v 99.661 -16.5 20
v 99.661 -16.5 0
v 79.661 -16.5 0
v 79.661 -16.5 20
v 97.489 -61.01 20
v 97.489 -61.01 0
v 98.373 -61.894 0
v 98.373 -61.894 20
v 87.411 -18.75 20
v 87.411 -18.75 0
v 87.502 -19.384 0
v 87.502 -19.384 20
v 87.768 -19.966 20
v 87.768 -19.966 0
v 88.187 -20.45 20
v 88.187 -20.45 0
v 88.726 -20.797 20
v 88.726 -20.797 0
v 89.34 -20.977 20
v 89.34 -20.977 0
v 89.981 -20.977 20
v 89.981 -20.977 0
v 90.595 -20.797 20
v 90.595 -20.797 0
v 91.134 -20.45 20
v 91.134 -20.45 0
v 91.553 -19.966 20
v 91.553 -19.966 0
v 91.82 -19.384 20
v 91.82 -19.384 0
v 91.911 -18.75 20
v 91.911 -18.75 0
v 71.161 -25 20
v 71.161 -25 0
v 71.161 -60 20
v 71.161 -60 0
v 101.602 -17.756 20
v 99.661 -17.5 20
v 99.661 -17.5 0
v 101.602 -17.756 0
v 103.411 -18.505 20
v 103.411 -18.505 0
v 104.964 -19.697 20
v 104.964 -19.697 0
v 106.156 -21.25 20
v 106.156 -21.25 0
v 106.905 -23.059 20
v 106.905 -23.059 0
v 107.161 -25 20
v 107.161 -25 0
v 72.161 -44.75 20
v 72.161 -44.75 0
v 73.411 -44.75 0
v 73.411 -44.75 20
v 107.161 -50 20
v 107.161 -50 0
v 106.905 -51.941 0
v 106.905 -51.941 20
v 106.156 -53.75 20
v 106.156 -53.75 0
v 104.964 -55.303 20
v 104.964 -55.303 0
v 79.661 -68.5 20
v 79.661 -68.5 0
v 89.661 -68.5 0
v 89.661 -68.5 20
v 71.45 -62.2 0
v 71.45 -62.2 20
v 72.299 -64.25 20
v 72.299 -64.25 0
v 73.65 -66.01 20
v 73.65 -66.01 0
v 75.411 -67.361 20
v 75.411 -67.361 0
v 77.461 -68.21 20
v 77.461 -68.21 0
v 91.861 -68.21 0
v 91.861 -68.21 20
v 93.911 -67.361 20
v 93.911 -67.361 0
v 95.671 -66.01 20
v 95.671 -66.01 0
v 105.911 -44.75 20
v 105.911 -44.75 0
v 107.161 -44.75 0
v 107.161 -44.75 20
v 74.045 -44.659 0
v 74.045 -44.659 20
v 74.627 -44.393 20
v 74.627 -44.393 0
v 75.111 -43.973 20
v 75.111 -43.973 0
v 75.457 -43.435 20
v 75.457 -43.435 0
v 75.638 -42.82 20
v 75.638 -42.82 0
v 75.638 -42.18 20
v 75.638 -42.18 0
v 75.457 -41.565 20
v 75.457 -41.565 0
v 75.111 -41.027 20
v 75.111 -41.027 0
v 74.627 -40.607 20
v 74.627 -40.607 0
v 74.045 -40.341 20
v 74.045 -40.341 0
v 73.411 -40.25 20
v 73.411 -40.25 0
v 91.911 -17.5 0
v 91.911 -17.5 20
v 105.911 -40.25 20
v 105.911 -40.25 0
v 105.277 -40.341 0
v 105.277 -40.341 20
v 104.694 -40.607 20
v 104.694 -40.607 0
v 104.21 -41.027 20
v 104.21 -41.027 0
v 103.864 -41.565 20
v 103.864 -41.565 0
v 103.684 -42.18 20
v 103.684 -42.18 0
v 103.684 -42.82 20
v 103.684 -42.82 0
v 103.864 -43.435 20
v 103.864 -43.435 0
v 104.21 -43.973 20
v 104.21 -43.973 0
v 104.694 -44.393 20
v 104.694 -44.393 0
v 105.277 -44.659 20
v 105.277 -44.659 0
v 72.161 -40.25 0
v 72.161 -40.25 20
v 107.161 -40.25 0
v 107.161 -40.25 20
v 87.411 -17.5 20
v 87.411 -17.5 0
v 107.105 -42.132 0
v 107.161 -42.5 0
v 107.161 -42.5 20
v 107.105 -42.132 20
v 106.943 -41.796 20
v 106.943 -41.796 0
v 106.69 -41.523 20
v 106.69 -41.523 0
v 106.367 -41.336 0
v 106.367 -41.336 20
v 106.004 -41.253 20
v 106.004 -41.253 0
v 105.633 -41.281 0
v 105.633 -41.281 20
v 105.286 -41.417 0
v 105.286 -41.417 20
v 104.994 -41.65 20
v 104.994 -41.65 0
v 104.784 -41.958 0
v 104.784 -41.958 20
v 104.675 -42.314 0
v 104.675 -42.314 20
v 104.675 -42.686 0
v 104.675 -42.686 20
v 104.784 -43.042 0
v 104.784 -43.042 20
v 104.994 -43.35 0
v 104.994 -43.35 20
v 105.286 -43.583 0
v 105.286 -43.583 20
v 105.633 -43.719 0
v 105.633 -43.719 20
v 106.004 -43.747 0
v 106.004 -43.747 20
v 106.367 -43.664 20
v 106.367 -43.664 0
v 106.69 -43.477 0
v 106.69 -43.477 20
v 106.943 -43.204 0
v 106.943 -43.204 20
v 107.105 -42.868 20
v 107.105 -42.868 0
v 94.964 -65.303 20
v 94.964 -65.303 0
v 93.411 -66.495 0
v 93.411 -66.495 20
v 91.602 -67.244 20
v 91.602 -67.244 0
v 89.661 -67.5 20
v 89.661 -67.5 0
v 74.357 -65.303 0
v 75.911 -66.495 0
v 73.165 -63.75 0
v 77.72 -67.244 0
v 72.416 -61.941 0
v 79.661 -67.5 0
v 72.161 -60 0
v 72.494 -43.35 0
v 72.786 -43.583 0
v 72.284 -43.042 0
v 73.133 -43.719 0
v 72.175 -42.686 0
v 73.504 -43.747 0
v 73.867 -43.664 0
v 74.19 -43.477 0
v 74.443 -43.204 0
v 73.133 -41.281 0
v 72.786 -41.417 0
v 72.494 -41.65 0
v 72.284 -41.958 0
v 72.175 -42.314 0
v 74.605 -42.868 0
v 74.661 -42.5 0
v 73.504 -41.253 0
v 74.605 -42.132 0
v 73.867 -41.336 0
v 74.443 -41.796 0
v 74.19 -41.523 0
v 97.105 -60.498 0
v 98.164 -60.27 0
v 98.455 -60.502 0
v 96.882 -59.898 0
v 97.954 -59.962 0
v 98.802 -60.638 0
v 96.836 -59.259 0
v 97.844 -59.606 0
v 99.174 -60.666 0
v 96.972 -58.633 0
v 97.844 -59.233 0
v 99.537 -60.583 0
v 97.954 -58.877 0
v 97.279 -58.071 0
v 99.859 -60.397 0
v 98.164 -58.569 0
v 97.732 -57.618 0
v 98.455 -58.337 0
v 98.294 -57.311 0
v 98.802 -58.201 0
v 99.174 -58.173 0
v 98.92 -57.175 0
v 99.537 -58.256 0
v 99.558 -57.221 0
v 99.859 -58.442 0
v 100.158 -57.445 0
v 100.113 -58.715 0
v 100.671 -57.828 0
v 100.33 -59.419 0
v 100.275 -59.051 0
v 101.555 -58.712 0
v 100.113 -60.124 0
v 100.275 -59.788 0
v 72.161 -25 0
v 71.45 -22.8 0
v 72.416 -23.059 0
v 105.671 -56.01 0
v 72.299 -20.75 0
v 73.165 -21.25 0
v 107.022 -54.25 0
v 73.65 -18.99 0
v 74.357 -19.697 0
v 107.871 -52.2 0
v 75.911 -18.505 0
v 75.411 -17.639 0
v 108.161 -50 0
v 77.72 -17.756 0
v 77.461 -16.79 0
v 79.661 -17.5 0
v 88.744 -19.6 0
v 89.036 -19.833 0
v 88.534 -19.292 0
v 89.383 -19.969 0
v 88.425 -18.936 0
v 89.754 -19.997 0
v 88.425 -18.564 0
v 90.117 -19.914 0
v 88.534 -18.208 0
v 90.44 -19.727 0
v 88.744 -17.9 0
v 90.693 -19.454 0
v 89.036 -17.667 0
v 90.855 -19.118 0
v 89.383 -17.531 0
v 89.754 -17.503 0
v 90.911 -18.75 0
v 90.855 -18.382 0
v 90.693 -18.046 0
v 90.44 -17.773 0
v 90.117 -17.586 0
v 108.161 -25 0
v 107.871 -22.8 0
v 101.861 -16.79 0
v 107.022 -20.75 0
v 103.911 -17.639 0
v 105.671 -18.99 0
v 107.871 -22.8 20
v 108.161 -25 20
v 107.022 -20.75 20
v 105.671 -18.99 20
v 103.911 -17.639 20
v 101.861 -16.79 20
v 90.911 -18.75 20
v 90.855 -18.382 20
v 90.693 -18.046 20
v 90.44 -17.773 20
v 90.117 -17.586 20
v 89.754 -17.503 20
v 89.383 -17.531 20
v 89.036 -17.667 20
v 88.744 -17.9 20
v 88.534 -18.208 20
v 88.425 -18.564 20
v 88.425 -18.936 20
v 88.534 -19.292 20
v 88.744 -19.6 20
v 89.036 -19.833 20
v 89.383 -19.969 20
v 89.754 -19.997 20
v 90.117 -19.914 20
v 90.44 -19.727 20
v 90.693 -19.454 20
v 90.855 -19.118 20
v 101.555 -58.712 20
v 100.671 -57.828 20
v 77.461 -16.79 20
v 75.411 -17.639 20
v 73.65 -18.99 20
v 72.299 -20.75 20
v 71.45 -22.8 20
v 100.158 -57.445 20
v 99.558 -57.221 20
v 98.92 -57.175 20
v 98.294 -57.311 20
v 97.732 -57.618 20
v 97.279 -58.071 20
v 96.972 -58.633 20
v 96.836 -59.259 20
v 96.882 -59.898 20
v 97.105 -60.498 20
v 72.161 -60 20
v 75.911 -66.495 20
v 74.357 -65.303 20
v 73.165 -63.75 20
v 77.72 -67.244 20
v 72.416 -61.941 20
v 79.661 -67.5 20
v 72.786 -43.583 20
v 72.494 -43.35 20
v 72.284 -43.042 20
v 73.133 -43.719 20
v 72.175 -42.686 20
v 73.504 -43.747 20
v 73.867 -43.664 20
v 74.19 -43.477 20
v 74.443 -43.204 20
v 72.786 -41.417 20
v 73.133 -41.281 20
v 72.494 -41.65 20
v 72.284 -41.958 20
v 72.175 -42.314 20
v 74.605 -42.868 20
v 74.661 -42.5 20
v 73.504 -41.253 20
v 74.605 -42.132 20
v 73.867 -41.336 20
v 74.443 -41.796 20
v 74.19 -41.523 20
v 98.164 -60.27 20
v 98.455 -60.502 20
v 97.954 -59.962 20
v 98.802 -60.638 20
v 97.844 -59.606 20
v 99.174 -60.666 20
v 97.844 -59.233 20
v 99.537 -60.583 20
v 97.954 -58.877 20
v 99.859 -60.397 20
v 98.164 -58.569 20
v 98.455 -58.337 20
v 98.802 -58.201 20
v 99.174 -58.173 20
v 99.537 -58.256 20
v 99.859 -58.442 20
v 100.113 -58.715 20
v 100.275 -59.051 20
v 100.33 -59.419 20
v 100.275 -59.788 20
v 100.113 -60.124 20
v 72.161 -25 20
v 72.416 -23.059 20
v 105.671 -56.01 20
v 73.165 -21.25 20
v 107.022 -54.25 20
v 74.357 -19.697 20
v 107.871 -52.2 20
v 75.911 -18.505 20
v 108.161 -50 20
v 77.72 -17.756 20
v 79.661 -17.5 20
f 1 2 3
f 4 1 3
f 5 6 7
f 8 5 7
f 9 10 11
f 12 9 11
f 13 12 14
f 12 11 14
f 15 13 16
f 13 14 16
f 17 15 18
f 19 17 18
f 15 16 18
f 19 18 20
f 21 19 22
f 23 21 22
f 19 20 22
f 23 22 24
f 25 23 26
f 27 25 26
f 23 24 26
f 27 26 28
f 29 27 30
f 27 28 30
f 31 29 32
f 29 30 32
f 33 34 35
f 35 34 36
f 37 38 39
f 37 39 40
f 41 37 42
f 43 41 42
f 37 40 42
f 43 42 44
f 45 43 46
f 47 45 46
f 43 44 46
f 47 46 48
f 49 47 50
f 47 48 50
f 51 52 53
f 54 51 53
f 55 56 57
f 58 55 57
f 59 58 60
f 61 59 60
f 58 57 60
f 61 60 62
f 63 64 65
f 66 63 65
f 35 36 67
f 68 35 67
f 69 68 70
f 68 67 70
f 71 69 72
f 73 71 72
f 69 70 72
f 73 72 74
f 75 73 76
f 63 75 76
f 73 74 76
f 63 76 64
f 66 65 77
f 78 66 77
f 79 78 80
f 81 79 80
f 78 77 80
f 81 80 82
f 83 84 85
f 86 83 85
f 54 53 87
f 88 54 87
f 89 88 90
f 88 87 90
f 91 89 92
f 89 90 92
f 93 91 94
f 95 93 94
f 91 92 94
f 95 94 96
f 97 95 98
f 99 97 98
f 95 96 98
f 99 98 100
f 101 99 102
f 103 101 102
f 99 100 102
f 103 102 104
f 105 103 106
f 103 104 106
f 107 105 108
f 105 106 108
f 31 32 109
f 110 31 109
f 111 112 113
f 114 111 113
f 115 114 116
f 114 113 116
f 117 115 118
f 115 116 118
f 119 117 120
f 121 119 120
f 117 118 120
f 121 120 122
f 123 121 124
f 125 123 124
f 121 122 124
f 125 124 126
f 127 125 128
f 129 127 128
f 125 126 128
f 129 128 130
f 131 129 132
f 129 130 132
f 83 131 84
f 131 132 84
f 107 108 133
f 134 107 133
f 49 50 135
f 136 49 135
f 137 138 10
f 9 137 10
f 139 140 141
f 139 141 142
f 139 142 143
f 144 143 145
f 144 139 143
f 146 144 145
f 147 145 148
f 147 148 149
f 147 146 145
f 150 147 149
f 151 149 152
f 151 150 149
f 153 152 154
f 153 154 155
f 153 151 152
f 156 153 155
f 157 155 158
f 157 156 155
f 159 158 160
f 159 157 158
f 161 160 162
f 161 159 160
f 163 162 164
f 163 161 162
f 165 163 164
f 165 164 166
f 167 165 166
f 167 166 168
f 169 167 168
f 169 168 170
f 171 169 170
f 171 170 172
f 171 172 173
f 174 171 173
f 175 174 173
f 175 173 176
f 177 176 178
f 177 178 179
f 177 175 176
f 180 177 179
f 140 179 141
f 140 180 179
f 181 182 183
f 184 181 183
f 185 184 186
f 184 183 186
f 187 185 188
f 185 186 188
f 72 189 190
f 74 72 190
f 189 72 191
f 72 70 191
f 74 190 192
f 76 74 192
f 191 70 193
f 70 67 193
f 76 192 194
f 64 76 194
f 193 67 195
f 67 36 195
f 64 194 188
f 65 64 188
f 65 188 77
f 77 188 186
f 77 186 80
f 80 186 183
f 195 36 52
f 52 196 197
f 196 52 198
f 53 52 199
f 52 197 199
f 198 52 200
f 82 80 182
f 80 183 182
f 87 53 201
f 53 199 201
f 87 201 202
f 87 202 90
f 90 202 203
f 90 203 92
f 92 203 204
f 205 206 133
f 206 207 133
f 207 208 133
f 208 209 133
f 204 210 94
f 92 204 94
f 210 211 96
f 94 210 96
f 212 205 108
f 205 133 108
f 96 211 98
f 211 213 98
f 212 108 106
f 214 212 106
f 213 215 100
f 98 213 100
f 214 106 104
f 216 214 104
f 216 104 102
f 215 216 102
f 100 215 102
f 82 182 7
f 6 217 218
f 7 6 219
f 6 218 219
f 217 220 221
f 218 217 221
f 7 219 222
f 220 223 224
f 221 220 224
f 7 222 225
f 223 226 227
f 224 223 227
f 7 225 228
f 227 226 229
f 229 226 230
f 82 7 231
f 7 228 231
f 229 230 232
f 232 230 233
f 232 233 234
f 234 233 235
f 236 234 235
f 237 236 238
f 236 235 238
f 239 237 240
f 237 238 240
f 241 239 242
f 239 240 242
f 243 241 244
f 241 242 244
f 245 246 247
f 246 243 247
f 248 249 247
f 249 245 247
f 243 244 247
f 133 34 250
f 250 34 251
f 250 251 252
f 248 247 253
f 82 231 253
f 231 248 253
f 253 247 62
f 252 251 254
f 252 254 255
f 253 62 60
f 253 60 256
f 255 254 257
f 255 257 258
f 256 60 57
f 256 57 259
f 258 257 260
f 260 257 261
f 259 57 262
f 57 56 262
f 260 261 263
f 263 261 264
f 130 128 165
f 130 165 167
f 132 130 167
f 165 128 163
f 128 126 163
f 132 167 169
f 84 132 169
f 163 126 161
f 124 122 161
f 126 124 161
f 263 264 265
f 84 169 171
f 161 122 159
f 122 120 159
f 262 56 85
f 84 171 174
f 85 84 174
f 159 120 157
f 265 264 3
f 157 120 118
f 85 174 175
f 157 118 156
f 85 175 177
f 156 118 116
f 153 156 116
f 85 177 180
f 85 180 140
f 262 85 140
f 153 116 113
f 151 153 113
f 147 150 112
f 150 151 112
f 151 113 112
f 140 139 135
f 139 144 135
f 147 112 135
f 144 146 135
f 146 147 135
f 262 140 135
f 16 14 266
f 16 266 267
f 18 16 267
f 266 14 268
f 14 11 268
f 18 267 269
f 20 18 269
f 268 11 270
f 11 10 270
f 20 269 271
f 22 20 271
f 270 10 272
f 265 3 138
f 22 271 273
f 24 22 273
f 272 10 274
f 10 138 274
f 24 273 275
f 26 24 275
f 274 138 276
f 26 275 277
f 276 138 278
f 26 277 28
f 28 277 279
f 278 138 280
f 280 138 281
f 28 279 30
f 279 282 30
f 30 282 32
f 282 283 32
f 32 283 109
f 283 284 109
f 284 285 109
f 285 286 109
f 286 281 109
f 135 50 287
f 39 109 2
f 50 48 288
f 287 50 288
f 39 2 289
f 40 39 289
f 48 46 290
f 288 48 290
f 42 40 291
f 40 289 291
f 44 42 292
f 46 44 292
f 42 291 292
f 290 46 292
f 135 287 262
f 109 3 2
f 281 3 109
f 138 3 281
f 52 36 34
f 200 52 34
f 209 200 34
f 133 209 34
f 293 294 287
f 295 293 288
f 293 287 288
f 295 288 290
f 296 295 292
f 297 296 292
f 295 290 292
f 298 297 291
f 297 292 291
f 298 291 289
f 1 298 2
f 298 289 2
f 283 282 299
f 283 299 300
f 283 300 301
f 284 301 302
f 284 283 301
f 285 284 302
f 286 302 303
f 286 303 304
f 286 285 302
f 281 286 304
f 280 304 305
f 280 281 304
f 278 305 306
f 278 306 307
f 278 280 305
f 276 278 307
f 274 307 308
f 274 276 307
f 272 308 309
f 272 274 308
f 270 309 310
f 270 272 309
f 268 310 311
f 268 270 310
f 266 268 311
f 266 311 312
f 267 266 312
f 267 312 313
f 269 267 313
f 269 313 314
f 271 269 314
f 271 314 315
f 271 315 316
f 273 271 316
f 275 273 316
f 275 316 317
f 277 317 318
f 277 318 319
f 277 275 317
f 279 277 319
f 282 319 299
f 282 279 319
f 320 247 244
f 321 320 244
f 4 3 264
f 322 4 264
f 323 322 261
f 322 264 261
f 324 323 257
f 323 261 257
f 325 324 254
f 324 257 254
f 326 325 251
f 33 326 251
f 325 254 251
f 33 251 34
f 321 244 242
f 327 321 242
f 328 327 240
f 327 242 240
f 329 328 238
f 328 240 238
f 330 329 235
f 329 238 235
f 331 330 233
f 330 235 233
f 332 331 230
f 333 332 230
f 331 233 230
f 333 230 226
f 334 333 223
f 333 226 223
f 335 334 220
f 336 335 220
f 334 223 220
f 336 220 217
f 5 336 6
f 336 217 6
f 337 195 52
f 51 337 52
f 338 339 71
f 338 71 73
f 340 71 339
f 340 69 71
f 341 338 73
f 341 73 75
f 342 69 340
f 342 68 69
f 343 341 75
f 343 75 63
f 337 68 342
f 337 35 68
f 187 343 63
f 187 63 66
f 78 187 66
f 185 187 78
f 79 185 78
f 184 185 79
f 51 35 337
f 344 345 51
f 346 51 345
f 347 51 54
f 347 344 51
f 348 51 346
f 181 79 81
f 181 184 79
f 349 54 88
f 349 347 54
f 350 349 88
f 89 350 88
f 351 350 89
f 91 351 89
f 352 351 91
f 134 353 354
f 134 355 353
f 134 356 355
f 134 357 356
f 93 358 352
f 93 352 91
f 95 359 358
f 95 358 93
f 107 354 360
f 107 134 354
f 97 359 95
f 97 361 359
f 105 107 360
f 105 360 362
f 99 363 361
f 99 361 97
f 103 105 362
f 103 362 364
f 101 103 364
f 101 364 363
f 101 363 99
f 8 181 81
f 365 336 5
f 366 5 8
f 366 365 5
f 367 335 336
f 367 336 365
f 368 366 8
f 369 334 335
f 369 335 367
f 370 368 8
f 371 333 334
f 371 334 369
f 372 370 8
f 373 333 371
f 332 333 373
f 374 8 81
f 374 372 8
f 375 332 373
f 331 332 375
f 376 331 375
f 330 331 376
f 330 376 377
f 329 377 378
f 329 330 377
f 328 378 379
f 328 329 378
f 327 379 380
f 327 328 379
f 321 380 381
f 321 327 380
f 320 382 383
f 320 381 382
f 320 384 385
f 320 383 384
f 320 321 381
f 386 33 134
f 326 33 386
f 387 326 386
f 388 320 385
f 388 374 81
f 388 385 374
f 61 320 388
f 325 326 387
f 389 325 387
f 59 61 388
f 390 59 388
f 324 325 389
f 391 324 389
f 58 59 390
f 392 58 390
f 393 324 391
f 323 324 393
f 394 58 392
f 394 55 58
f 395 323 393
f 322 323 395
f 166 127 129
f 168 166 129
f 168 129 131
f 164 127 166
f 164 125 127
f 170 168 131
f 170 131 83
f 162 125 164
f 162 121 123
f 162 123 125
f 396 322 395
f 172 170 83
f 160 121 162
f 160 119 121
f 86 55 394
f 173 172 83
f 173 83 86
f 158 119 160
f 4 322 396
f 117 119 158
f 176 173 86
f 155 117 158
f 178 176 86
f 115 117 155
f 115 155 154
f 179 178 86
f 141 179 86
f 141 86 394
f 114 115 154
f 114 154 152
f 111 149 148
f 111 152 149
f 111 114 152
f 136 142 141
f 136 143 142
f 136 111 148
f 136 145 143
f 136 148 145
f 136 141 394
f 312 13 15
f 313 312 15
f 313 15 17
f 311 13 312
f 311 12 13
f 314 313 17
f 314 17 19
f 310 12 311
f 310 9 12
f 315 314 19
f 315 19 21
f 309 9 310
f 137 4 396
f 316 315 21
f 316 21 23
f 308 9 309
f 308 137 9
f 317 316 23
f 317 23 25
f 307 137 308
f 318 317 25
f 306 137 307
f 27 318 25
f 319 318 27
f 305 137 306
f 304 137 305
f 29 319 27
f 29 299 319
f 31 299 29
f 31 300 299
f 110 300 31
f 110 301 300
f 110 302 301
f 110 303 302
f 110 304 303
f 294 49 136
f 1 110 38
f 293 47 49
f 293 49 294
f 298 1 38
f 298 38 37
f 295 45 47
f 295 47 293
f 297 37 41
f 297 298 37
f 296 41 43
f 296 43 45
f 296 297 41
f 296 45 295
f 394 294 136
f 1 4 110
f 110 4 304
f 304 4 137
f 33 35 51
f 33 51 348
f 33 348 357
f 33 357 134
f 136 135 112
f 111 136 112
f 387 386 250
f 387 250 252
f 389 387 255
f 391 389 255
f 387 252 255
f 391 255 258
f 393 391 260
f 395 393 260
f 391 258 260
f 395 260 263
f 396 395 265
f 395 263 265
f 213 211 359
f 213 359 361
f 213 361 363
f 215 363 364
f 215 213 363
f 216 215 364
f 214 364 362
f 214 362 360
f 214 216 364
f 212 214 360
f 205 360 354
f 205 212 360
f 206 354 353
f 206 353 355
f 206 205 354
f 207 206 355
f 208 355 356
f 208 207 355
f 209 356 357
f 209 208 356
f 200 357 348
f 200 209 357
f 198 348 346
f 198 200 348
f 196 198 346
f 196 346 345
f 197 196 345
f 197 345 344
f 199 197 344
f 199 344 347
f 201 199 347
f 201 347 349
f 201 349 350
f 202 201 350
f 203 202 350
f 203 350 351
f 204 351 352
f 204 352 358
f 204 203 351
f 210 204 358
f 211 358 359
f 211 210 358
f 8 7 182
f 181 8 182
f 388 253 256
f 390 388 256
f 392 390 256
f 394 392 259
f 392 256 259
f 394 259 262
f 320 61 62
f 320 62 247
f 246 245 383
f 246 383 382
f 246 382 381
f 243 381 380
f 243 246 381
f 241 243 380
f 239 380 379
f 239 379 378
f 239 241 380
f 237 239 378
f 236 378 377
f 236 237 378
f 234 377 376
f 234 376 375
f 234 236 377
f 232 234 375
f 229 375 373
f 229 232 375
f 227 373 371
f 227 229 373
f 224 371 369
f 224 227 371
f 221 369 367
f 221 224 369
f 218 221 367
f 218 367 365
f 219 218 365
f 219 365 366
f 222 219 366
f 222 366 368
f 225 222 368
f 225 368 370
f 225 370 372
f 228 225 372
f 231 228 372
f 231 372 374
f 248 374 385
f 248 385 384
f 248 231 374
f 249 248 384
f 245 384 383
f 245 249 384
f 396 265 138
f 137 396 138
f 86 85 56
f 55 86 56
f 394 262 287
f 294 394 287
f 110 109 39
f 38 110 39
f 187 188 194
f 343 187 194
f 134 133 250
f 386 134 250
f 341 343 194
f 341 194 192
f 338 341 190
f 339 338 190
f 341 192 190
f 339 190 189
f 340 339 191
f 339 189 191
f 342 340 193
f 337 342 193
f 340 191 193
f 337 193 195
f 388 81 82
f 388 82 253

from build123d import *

# Parameters (mm, degrees)
SKETCH1_R           = 1.25
BOSS_EXTRUDE1_DEPTH = 20


with BuildPart() as part:
    # Sketch1 → Boss-Extrude1 (new body)
    with BuildSketch(Plane.XY):
        with BuildLine():
            Line((95.67108193, -66.01040764), (105.67108193, -56.01040764))
            ThreePointArc((105.67108193, -56.01040764), (107.513650317, -53.252809175), (108.16067429, -50))
            Line((108.16067429, -50), (108.16067429, -25))
            ThreePointArc((108.16067429, -25), (105.67108193, -18.98959236), (99.66067429, -16.5))
            Line((99.66067429, -16.5), (79.66067429, -16.5))
            ThreePointArc((79.66067429, -16.5), (73.65026665, -18.98959236), (71.16067429, -25))
            Line((71.16067429, -25), (71.16067429, -60))
            ThreePointArc((71.16067429, -60), (73.65026665, -66.01040764), (79.66067429, -68.5))
            Line((79.66067429, -68.5), (89.66067429, -68.5))
            ThreePointArc((89.66067429, -68.5), (92.913483465, -67.852976026), (95.67108193, -66.01040764))
        make_face()
        with Locations((73.41067429, -42.5)):
            Circle(SKETCH1_R, mode=Mode.SUBTRACT)
        with BuildLine():
            Line((104.963975149, -55.303300859), (101.554965407, -58.712310601))
            Line((101.554965407, -58.712310601), (100.67108193, -57.828427125))
            ThreePointArc((100.67108193, -57.828427125), (97.489101415, -57.828427125), (97.489101415, -61.01040764))
            Line((97.489101415, -61.01040764), (98.372984892, -61.894291117))
            Line((98.372984892, -61.894291117), (94.963975149, -65.303300859))
            ThreePointArc((94.963975149, -65.303300859), (92.530800033, -66.929096494), (89.66067429, -67.5))
            Line((89.66067429, -67.5), (79.66067429, -67.5))
            ThreePointArc((79.66067429, -67.5), (74.357373431, -65.303300859), (72.16067429, -60))
            Line((72.16067429, -60), (72.16067429, -44.75))
            Line((72.16067429, -44.75), (73.41067429, -44.75))
            ThreePointArc((73.41067429, -44.75), (75.66067429, -42.5), (73.41067429, -40.25))
            Line((73.41067429, -40.25), (72.16067429, -40.25))
            Line((72.16067429, -40.25), (72.16067429, -25))
            ThreePointArc((72.16067429, -25), (74.357373431, -19.696699141), (79.66067429, -17.5))
            Line((79.66067429, -17.5), (87.41067429, -17.5))
            Line((87.41067429, -17.5), (87.41067429, -18.75))
            ThreePointArc((87.41067429, -18.75), (89.66067429, -21), (91.91067429, -18.75))
            Line((91.91067429, -18.75), (91.91067429, -17.5))
            Line((91.91067429, -17.5), (99.66067429, -17.5))
            ThreePointArc((99.66067429, -17.5), (104.963975149, -19.696699141), (107.16067429, -25))
            Line((107.16067429, -25), (107.16067429, -40.25))
            Line((107.16067429, -40.25), (105.91067429, -40.25))
            ThreePointArc((105.91067429, -40.25), (103.66067429, -42.5), (105.91067429, -44.75))
            Line((105.91067429, -44.75), (107.16067429, -44.75))
            Line((107.16067429, -44.75), (107.16067429, -50))
            ThreePointArc((107.16067429, -50), (106.589770784, -52.870125743), (104.963975149, -55.303300859))
        make_face(mode=Mode.SUBTRACT)
        with Locations((89.66067429, -18.75)):
            Circle(SKETCH1_R, mode=Mode.SUBTRACT)
        with Locations((105.91067429, -42.5)):
            Circle(SKETCH1_R, mode=Mode.SUBTRACT)
        with Locations((99.080091673, -59.419417382)):
            Circle(SKETCH1_R, mode=Mode.SUBTRACT)
    extrude(amount=BOSS_EXTRUDE1_DEPTH)


solid = part.part
